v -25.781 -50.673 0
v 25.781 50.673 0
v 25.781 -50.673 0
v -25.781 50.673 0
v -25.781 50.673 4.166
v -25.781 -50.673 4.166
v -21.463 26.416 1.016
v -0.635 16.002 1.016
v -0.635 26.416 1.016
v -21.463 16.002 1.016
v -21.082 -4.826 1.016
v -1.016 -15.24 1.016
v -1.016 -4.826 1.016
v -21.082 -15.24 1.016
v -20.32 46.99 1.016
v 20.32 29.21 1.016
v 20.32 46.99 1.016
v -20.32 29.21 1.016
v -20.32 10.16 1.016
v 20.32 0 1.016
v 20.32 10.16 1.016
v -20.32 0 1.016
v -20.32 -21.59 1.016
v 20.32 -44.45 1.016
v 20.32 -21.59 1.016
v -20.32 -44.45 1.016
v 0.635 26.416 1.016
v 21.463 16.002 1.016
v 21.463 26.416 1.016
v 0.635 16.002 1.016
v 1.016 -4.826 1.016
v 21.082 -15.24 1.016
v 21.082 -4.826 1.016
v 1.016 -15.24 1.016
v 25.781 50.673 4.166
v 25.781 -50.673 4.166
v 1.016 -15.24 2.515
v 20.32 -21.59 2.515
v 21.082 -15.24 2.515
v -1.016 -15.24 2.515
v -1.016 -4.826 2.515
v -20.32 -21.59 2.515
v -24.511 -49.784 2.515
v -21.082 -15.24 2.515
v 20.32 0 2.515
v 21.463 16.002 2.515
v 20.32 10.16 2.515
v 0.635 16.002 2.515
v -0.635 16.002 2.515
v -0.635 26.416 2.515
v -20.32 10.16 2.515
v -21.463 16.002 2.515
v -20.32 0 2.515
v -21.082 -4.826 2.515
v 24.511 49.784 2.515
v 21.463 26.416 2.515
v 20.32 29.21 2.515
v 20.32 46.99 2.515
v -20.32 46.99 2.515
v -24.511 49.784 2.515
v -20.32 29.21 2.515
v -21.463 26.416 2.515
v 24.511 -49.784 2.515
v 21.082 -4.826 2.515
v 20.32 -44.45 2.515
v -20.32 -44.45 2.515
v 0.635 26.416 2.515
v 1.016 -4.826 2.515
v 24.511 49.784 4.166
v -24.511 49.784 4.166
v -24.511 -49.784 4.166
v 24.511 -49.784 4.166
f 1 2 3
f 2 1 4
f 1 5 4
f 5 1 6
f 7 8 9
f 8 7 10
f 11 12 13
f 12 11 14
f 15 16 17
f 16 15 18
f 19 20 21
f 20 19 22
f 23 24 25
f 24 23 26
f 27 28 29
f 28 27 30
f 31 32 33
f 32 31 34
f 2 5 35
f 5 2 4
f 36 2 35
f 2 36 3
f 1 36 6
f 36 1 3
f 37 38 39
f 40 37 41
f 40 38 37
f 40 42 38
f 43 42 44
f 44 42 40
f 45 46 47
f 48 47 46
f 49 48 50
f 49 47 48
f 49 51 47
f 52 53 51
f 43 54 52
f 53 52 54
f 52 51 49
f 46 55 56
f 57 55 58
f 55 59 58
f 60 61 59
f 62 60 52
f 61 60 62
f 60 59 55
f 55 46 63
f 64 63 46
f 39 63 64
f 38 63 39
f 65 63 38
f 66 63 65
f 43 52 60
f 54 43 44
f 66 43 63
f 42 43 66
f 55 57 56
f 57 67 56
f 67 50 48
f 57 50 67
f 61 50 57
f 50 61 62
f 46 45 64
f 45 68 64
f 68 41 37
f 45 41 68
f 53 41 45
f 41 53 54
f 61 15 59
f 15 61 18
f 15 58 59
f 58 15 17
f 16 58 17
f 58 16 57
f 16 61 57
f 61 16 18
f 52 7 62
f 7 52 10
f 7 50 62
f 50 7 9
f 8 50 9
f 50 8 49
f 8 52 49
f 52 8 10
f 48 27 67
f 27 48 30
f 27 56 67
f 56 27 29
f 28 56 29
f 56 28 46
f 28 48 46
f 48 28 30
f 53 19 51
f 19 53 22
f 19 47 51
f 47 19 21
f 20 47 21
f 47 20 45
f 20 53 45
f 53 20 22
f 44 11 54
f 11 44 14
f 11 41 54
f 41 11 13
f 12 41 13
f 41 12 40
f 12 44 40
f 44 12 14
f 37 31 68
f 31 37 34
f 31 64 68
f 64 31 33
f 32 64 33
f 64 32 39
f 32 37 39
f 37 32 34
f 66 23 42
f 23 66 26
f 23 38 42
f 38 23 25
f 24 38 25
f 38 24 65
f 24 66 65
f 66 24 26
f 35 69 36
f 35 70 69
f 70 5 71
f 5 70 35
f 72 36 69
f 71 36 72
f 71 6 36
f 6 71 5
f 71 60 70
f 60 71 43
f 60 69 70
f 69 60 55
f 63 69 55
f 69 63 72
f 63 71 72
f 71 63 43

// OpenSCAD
// file: components23.scad
module d23() 
{
translate([1469-1970/2,2480-3940/2,60])
circle(67/2, $fn=96);
translate([600-1970/2,2244-3940/2,60])
circle(67/2, $fn=96);
translate([1516-1970/2,250-3940/2,60])
circle(67/2, $fn=96);
translate([1553-1970/2,2362-3940/2,60])
circle(67/2, $fn=96);
translate([1012-1970/2,2126-3940/2,60])
circle(67/2, $fn=96);
translate([978-1970/2,673-3940/2,60])
circle(67/2, $fn=96);
}
// file: components22.scad
d22 = function(i) [896-1970/2,228-3940/2,1073-1970/2,559-3940/2][i];

module d22()
{
    hull()
    {
    translate([1073-1970/2,228-3940/2,60])
    square([63, 71], center=true);
    translate([1073-1970/2,559-3940/2,60])
    square([63, 71], center=true);
    translate([984-1970/2,559-3940/2,60])
    square([63, 71], center=true);
    translate([896-1970/2,559-3940/2,60])
    square([63, 71], center=true);
    translate([896-1970/2,228-3940/2,60])
    square([63, 71], center=true);
    }
}
// file: components21.scad
module d21()
{
translate([394-1970/2,469-3940/2,60])
square([79, 87], center=true);
}
// file: components20.scad
d20 = function() [[59, 87], [[344,319,443,319]]];

// module d20()
// {
// translate([344-1970/2,319-3940/2,60])
// square([59, 87], center=true);
// translate([443-1970/2,319-3940/2,60])
// square([59, 87], center=true);
// }
// file: components19.scad
d19 = function() [[71, 79], [[1657,2126,1769,2126], [790,2362,902,2362], [790,2126,902,2126],[790,2244,902,2244]]];

//module d19()
//{
//translate([1657-1970/2,2244-3940/2,60])
//square([71, 79], center=true);
//translate([1769-1970/2,2244-3940/2,60])
//square([71, 79], center=true);
//translate([1657-1970/2,2126-3940/2,60])
//square([71, 79], center=true);
//translate([1769-1970/2,2126-3940/2,60])
//square([71, 79], center=true);
//translate([790-1970/2,2362-3940/2,60])
//square([71, 79], center=true);
//translate([902-1970/2,2362-3940/2,60])
//square([71, 79], center=true);
//translate([790-1970/2,2126-3940/2,60])
//square([71, 79], center=true);
//translate([902-1970/2,2126-3940/2,60])
//square([71, 79], center=true);
//translate([790-1970/2,2244-3940/2,60])
//square([71, 79], center=true);
//translate([902-1970/2,2244-3940/2,60])
//square([71, 79], center=true);
//}
// file: components18.scad
d18 = function() [[79, 71], [[197,3363,197,3251],[394,771,394,883],[394,3363,394,3251],[591,3363,591,3251],[787,3363,787,3251],[984,3363,984,3251],[1181,3363,1181,3251],[1378,3363,1378,3251],[1575,3363,1575,3251],[1772,3363,1772,3251]]];


// module d18()
// {
// translate([197-1970/2,3363-3940/2,60])
// square([79, 71], center=true);
// translate([197-1970/2,3251-3940/2,60])
// square([79, 71], center=true);
// translate([394-1970/2,771-3940/2,60])
// square([79, 71], center=true);
// translate([394-1970/2,883-3940/2,60])
// square([79, 71], center=true);
// translate([394-1970/2,3363-3940/2,60])
// square([79, 71], center=true);
// translate([394-1970/2,3251-3940/2,60])
// square([79, 71], center=true);
// translate([591-1970/2,3363-3940/2,60])
// square([79, 71], center=true);
// translate([591-1970/2,3251-3940/2,60])
// square([79, 71], center=true);
// translate([787-1970/2,3363-3940/2,60])
// square([79, 71], center=true);
// translate([787-1970/2,3251-3940/2,60])
// square([79, 71], center=true);
// translate([984-1970/2,3363-3940/2,60])
// square([79, 71], center=true);
// translate([984-1970/2,3251-3940/2,60])
// square([79, 71], center=true);
// translate([1181-1970/2,3363-3940/2,60])
// square([79, 71], center=true);
// translate([1181-1970/2,3251-3940/2,60])
// square([79, 71], center=true);
// translate([1378-1970/2,3363-3940/2,60])
// square([79, 71], center=true);
// translate([1378-1970/2,3251-3940/2,60])
// square([79, 71], center=true);
// translate([1575-1970/2,3363-3940/2,60])
// square([79, 71], center=true);
// translate([1575-1970/2,3251-3940/2,60])
// square([79, 71], center=true);
// translate([1772-1970/2,3363-3940/2,60])
// square([79, 71], center=true);
// translate([1772-1970/2,3251-3940/2,60])
// square([79, 71], center=true);
// }
// file: components17.scad
d17 = function()
    [[67, 67], [[197,3612,197,3474], [394,3612,394,3474], [591,3612,591,3474], [787,3612,787,3474], [1181,3612,1181,3474], [1378,3612,1378,3474], [1575,3612,1575,3474], [1772,3612,1772,3474], [984,3612,984,3474]]];


// module d17()
// {
// translate([197-1970/2,3612-3940/2,60])
// square([67, 67], center=true);
// translate([197-1970/2,3474-3940/2,60])
// square([67, 67], center=true);
// translate([394-1970/2,3612-3940/2,60])
// square([67, 67], center=true);
// translate([394-1970/2,3474-3940/2,60])
// square([67, 67], center=true);
// translate([591-1970/2,3612-3940/2,60])
// square([67, 67], center=true);
// translate([591-1970/2,3474-3940/2,60])
// square([67, 67], center=true);
// translate([787-1970/2,3612-3940/2,60])
// square([67, 67], center=true);
// translate([787-1970/2,3474-3940/2,60])
// square([67, 67], center=true);
// translate([1181-1970/2,3612-3940/2,60])
// square([67, 67], center=true);
// translate([1181-1970/2,3474-3940/2,60])
// square([67, 67], center=true);
// translate([1378-1970/2,3612-3940/2,60])
// square([67, 67], center=true);
// translate([1378-1970/2,3474-3940/2,60])
// square([67, 67], center=true);
// translate([1575-1970/2,3612-3940/2,60])
// square([67, 67], center=true);
// translate([1575-1970/2,3474-3940/2,60])
// square([67, 67], center=true);
// translate([1772-1970/2,3612-3940/2,60])
// square([67, 67], center=true);
// translate([1772-1970/2,3474-3940/2,60])
// square([67, 67], center=true);
// translate([984-1970/2,3612-3940/2,60])
// square([67, 67], center=true);
// translate([984-1970/2,3474-3940/2,60])
// square([67, 67], center=true);
// }
// file: components16.scad
module d16()
{
translate([1715-1970/2,142-3940/2,60])
circle(68/2, $fn=96);
translate([1715-1970/2,82-3940/2,60])
circle(68/2, $fn=96);
translate([1815-1970/2,82-3940/2,60])
circle(68/2, $fn=96);
translate([1815-1970/2,142-3940/2,60])
circle(68/2, $fn=96);
}
// file: components15.scad
d15 = function() [[106, 126], [[1575,435, 1575,435]]];

// module d15()
// {
// translate([1575-1970/2,435-3940/2,60])
// square([106, 126], center=true);
// }
// file: components14.scad
d14 = function() [[39, 67], [[1634,325,1575,325]]];

// module d14()
// {
// translate([1634-1970/2,325-3940/2,60])
// square([39, 67], center=true);
// translate([1516-1970/2,325-3940/2,60])
// square([39, 67], center=true);
// translate([1575-1970/2,325-3940/2,60])
// square([39, 67], center=true);
// }
// file: components13.scad
ic1 = function(i) [201-1970/2,  2580-3940/2, 901-1970/2, 2632-3940/2][i];
ic2 = function(i) [1067-1970/2,2580-3940/2, 1767-1970/2,2632-3940/2][i];
ic3 = function(i) [1117-1970/2,1399-3940/2, 1717-1970/2,1751-3940/2][i];
ic4 = function(i) [251-1970/2,1399-3940/2,851-1970/2,1751-3940/2][i];


// module d13()
// {
// *color("red")
// {
// translate([201-1970/2,2580-3940/2,60])
// circle(60/2, $fn=96);
// translate([201-1970/2,2632-3940/2,60])
// circle(60/2, $fn=96);
// translate([301-1970/2,2632-3940/2,60])
// circle(60/2, $fn=96);
// translate([301-1970/2,2580-3940/2,60])
// circle(60/2, $fn=96);
// translate([801-1970/2,2580-3940/2,60])
// circle(60/2, $fn=96);
// translate([801-1970/2,2632-3940/2,60])
// circle(60/2, $fn=96);
// translate([901-1970/2,2632-3940/2,60])
// circle(60/2, $fn=96);
// translate([901-1970/2,2580-3940/2,60])
// circle(60/2, $fn=96);
// translate([401-1970/2,2580-3940/2,60])
// circle(60/2, $fn=96);
// translate([401-1970/2,2632-3940/2,60])
// circle(60/2, $fn=96);
// translate([501-1970/2,2632-3940/2,60])
// circle(60/2, $fn=96);
// translate([501-1970/2,2580-3940/2,60])
// circle(60/2, $fn=96);
// translate([701-1970/2,2580-3940/2,60])
// circle(60/2, $fn=96);
// translate([701-1970/2,2632-3940/2,60])
// circle(60/2, $fn=96);
// translate([601-1970/2,2632-3940/2,60])
// circle(60/2, $fn=96);
// translate([601-1970/2,2580-3940/2,60])
// circle(60/2, $fn=96);
// translate([901-1970/2,2880-3940/2,60])
// circle(60/2, $fn=96);
// translate([901-1970/2,2932-3940/2,60])
// circle(60/2, $fn=96);
// translate([801-1970/2,2932-3940/2,60])
// circle(60/2, $fn=96);
// translate([801-1970/2,2880-3940/2,60])
// circle(60/2, $fn=96);
// translate([701-1970/2,2880-3940/2,60])
// circle(60/2, $fn=96);
// translate([701-1970/2,2932-3940/2,60])
// circle(60/2, $fn=96);
// translate([601-1970/2,2932-3940/2,60])
// circle(60/2, $fn=96);
// translate([601-1970/2,2880-3940/2,60])
// circle(60/2, $fn=96);
// translate([501-1970/2,2880-3940/2,60])
// circle(60/2, $fn=96);
// translate([501-1970/2,2932-3940/2,60])
// circle(60/2, $fn=96);
// translate([401-1970/2,2932-3940/2,60])
// circle(60/2, $fn=96);
// translate([401-1970/2,2880-3940/2,60])
// circle(60/2, $fn=96);
// translate([301-1970/2,2880-3940/2,60])
// circle(60/2, $fn=96);
// translate([301-1970/2,2932-3940/2,60])
// circle(60/2, $fn=96);
// translate([201-1970/2,2932-3940/2,60])
// circle(60/2, $fn=96);
// translate([201-1970/2,2880-3940/2,60])
// circle(60/2, $fn=96);
// }
// *color("red")
// {
// translate([1067-1970/2,2632-3940/2,60])
// circle(60/2, $fn=96);
// translate([1067-1970/2,2580-3940/2,60])
// circle(60/2, $fn=96);
// translate([1167-1970/2,2580-3940/2,60])
// circle(60/2, $fn=96);
// translate([1167-1970/2,2632-3940/2,60])
// circle(60/2, $fn=96);
// translate([1667-1970/2,2632-3940/2,60])
// circle(60/2, $fn=96);
// translate([1667-1970/2,2580-3940/2,60])
// circle(60/2, $fn=96);
// translate([1767-1970/2,2580-3940/2,60])
// circle(60/2, $fn=96);
// translate([1767-1970/2,2632-3940/2,60])
// circle(60/2, $fn=96);
// translate([1267-1970/2,2632-3940/2,60])
// circle(60/2, $fn=96);
// translate([1267-1970/2,2580-3940/2,60])
// circle(60/2, $fn=96);
// translate([1367-1970/2,2580-3940/2,60])
// circle(60/2, $fn=96);
// translate([1367-1970/2,2632-3940/2,60])
// circle(60/2, $fn=96);
// translate([1567-1970/2,2632-3940/2,60])
// circle(60/2, $fn=96);
// translate([1567-1970/2,2580-3940/2,60])
// circle(60/2, $fn=96);
// translate([1467-1970/2,2580-3940/2,60])
// circle(60/2, $fn=96);
// translate([1467-1970/2,2632-3940/2,60])
// circle(60/2, $fn=96);
// translate([1767-1970/2,2880-3940/2,60])
// circle(60/2, $fn=96);
// translate([1767-1970/2,2932-3940/2,60])
// circle(60/2, $fn=96);
// translate([1667-1970/2,2932-3940/2,60])
// circle(60/2, $fn=96);
// translate([1667-1970/2,2880-3940/2,60])
// circle(60/2, $fn=96);
// translate([1567-1970/2,2880-3940/2,60])
// circle(60/2, $fn=96);
// translate([1567-1970/2,2932-3940/2,60])
// circle(60/2, $fn=96);
// translate([1467-1970/2,2932-3940/2,60])
// circle(60/2, $fn=96);
// translate([1467-1970/2,2880-3940/2,60])
// circle(60/2, $fn=96);
// translate([1367-1970/2,2880-3940/2,60])
// circle(60/2, $fn=96);
// translate([1367-1970/2,2932-3940/2,60])
// circle(60/2, $fn=96);
// translate([1267-1970/2,2932-3940/2,60])
// circle(60/2, $fn=96);
// translate([1267-1970/2,2880-3940/2,60])
// circle(60/2, $fn=96);
// translate([1167-1970/2,2880-3940/2,60])
// circle(60/2, $fn=96);
// translate([1167-1970/2,2932-3940/2,60])
// circle(60/2, $fn=96);
// translate([1067-1970/2,2932-3940/2,60])
// circle(60/2, $fn=96);
// translate([1067-1970/2,2880-3940/2,60])
// circle(60/2, $fn=96);
// }
// *color("red")
// {
// translate([1117-1970/2,1451-3940/2,60])
// circle(60/2, $fn=96);
// translate([1117-1970/2,1399-3940/2,60])
// circle(60/2, $fn=96);
// translate([1217-1970/2,1399-3940/2,60])
// circle(60/2, $fn=96);
// translate([1217-1970/2,1451-3940/2,60])
// circle(60/2, $fn=96);
// translate([1717-1970/2,1451-3940/2,60])
// circle(60/2, $fn=96);
// translate([1717-1970/2,1399-3940/2,60])
// circle(60/2, $fn=96);
// translate([1717-1970/2,1699-3940/2,60])
// circle(60/2, $fn=96);
// translate([1717-1970/2,1751-3940/2,60])
// circle(60/2, $fn=96);
// translate([1317-1970/2,1451-3940/2,60])
// circle(60/2, $fn=96);
// translate([1317-1970/2,1399-3940/2,60])
// circle(60/2, $fn=96);
// translate([1417-1970/2,1399-3940/2,60])
// circle(60/2, $fn=96);
// translate([1417-1970/2,1451-3940/2,60])
// circle(60/2, $fn=96);
// translate([1617-1970/2,1451-3940/2,60])
// circle(60/2, $fn=96);
// translate([1617-1970/2,1399-3940/2,60])
// circle(60/2, $fn=96);
// translate([1517-1970/2,1399-3940/2,60])
// circle(60/2, $fn=96);
// translate([1517-1970/2,1451-3940/2,60])
// circle(60/2, $fn=96);
// translate([1617-1970/2,1699-3940/2,60])
// circle(60/2, $fn=96);
// translate([1617-1970/2,1751-3940/2,60])
// circle(60/2, $fn=96);
// translate([1517-1970/2,1751-3940/2,60])
// circle(60/2, $fn=96);
// translate([1517-1970/2,1699-3940/2,60])
// circle(60/2, $fn=96);
// translate([1417-1970/2,1699-3940/2,60])
// circle(60/2, $fn=96);
// translate([1417-1970/2,1751-3940/2,60])
// circle(60/2, $fn=96);
// translate([1317-1970/2,1751-3940/2,60])
// circle(60/2, $fn=96);
// translate([1317-1970/2,1699-3940/2,60])
// circle(60/2, $fn=96);
// translate([1217-1970/2,1699-3940/2,60])
// circle(60/2, $fn=96);
// translate([1217-1970/2,1751-3940/2,60])
// circle(60/2, $fn=96);
// translate([1117-1970/2,1751-3940/2,60])
// circle(60/2, $fn=96);
// translate([1117-1970/2,1699-3940/2,60])
// circle(60/2, $fn=96);
// }
// color("red")
// {
// translate([251-1970/2,1451-3940/2,60])
// circle(60/2, $fn=96);
// translate([251-1970/2,1399-3940/2,60])
// circle(60/2, $fn=96);
// translate([351-1970/2,1399-3940/2,60])
// circle(60/2, $fn=96);
// translate([351-1970/2,1451-3940/2,60])
// circle(60/2, $fn=96);
// translate([851-1970/2,1451-3940/2,60])
// circle(60/2, $fn=96);
// translate([851-1970/2,1399-3940/2,60])
// circle(60/2, $fn=96);
// translate([851-1970/2,1699-3940/2,60])
// circle(60/2, $fn=96);
// translate([851-1970/2,1751-3940/2,60])
// circle(60/2, $fn=96);
// translate([451-1970/2,1451-3940/2,60])
// circle(60/2, $fn=96);
// translate([451-1970/2,1399-3940/2,60])
// circle(60/2, $fn=96);
// translate([551-1970/2,1399-3940/2,60])
// circle(60/2, $fn=96);
// translate([551-1970/2,1451-3940/2,60])
// circle(60/2, $fn=96);
// translate([751-1970/2,1451-3940/2,60])
// circle(60/2, $fn=96);
// translate([751-1970/2,1399-3940/2,60])
// circle(60/2, $fn=96);
// translate([651-1970/2,1399-3940/2,60])
// circle(60/2, $fn=96);
// translate([651-1970/2,1451-3940/2,60])
// circle(60/2, $fn=96);
// translate([751-1970/2,1699-3940/2,60])
// circle(60/2, $fn=96);
// translate([751-1970/2,1751-3940/2,60])
// circle(60/2, $fn=96);
// translate([651-1970/2,1751-3940/2,60])
// circle(60/2, $fn=96);
// translate([651-1970/2,1699-3940/2,60])
// circle(60/2, $fn=96);
// translate([551-1970/2,1699-3940/2,60])
// circle(60/2, $fn=96);
// translate([551-1970/2,1751-3940/2,60])
// circle(60/2, $fn=96);
// translate([451-1970/2,1751-3940/2,60])
// circle(60/2, $fn=96);
// translate([451-1970/2,1699-3940/2,60])
// circle(60/2, $fn=96);
// translate([351-1970/2,1699-3940/2,60])
// circle(60/2, $fn=96);
// translate([351-1970/2,1751-3940/2,60])
// circle(60/2, $fn=96);
// translate([251-1970/2,1751-3940/2,60])
// circle(60/2, $fn=96);
// translate([251-1970/2,1699-3940/2,60])
// circle(60/2, $fn=96);
// }
// }
// file: components12.scad
d12 = function()
[[102, 102], [[933,2008,760,2008],[1811,307,1811,480]]];

// module d12()
// {
// translate([933-1970/2,2008-3940/2,60])
// square([102, 102], center=true);
// translate([760-1970/2,2008-3940/2,60])
// square([102, 102], center=true);
// translate([1811-1970/2,307-3940/2,60])
// square([102, 102], center=true);
// translate([1811-1970/2,480-3940/2,60])
// square([102, 102], center=true);
// }
// file: components11.scad
d11 = function()
    [[71, 63], [[984,772,984,882],[128,1520,128,1630]]];
//translate([984,772])
//translate([984,882])
//translate([128,1520])
//translate([128,1630])

//module d11()
//{
//translate([984-1970/2,772-3940/2,60])
//square([71, 63], center=true);
//translate([984-1970/2,882-3940/2,60])
//square([71, 63], center=true);
//translate([128-1970/2,1520-3940/2,60])
//square([71, 63], center=true);
//translate([128-1970/2,1630-3940/2,60])
//square([71, 63], center=true);
//}
// file: components10.scad
d10 = function() 
    [[71, 79],[[791,2480,902,2480],[1657,2480,1768,2480],[1657,2362,1768,2362],[339,181,449,181],[1630,722,1630,624],[1520,722,1520,624]]];

//module d10()
//{
//    coords = [[791,2480,902,2480],[1657,2480,1768,2480],[1657,2362,1768,2362],[339,181,449,181],[1630,722,1630,624],[1520,722,1520,624]];
//
//    translate([0, 0, 60]) linear_extrude(100)
//    {
//        for (ii = coords)
//        {
//            hull() {
//                translate([ii[0]-1970/2,ii[1]-3940/2,0])
//                square([71, 79], center=true);
//                translate([ii[2]-1970/2,ii[3]-3940/2,0])
//                square([71, 79], center=true);
//            }
//        }
//    }
//}
// file: components_top.scad
include <components10.scad>
include <components11.scad>
include <components12.scad>
include <components13.scad>
include <components14.scad>
include <components15.scad>
include <components16.scad>
include <components17.scad>
include <components18.scad>
include <components19.scad>
include <components20.scad>
include <components21.scad>
include <components22.scad>
include <components23.scad>

module plot_components(size, coords)
{
    translate([0, 0, 0]) linear_extrude(100)
    {
        for (ii = coords)
        {
            hull() {
                translate([ii[0]-1970/2,ii[1]-3940/2,0])
                square(size, center=true);
                translate([ii[2]-1970/2,ii[3]-3940/2,0])
                square(size, center=true);
            }
        }
    }
}

module components_top()
{
    plot_components(d10()[0], d10()[1]);
    plot_components(d11()[0], d11()[1]);
    plot_components(d12()[0], d12()[1]);
//    d13(); // chips
    plot_components(d14()[0], d14()[1]);
    plot_components(d15()[0], d15()[1]);

    d16();
    plot_components(d17()[0], d17()[1]); // LEDs
    plot_components(d18()[0], d18()[1]); 
    plot_components(d19()[0], d19()[1]);
    //
    //plot_components(d20()[0], d20()[1]);
    *linear_extrude(100)
    d21();
    //
    //linear_extrude(100)
    //d22();
    d23();
}
// file: ../models/0805_resistor.scad
module model_0805_resistor()
{
    // End caps
    color("lightgray")
    {
        linear_extrude(20)
        {
            translate([40+21/2, 0, 0])
            square([21, 60], center=true);
            translate([-40-21/2, 0, 0])
            square([21, 60], center=true);
        }
    }
    // Body
    color("black")
    linear_extrude(20)
    square([80, 60], center=true);
}
// file: model_shoot.scad
include <../models/0805_resistor.scad>
//include <soldermask_top.scad>
include <components_top.scad>

model_shoot_chipSocket = function (pins) [400, pins * 100];
model_shoot_chipIC = function (pins) [240, 770];
model_shoot_pcb = function() [1970, 3940];
model_shoot_pcbX = function(x,xofs) -(model_shoot_pcb()[0]/2)+(x/2)+xofs;
model_shoot_pcbY = function(y,yofs) -(model_shoot_pcb()[1]/2)+(y/2)+yofs;
centerof = function(x0, x1) (x1 - x0)/2 + x0;


module model_shoot_ic(pins)
{
    // Socket
    color("darkslategray")
    linear_extrude(170)
    square(model_shoot_chipSocket(pins/2), center=true);

    // IC
    color("darkslategray")
    translate([0, 0, 169])
    linear_extrude(169)
    square(model_shoot_chipIC(pins/2), center=true);

    // Pins
    pinV = (pins/2 % 2) ? [-floor(pins/4)*100:100:floor(pins/4)*100] : [-floor(pins/4)*100+50:100:floor(pins/4)*100-50];
    for(ii = pinV)
    {
        for(jj = [-200+30+10, 200-30-10])
        {
            translate([jj, ii, 159])
            color("lightgrey")
            linear_extrude(20)
            circle(60/2, $fn=96);
        }
    }
}

module model_shoot_led()
{
    color("white")
    linear_extrude(10)
    square([130, 60], center=true);

    color("red")
    translate([0, 0, 9])
    linear_extrude(28)
    square([75, 60], center=true);
}


module model_shoot()
{
    translate([0, 0, 60])
    components_top();
    mspcbx = model_shoot_pcbX;
    mspcby = model_shoot_pcbY;
    mscs = model_shoot_chipSocket;

    pcbW = 3940;
    pcbH = 1970;
//    chipSocketW = 400;
    // PCB
    color("darkblue")
    linear_extrude(62)
    square(model_shoot_pcb(), center=true);

    // ICs
    translate([centerof(ic1(0), ic1(2)), centerof(ic1(1), ic1(3)) + 200, 61])
    rotate([0, 0, 90])
    model_shoot_ic(16);

    translate([centerof(ic2(0), ic2(2)), centerof(ic2(1), ic2(3)) + 200, 61])
    rotate([0, 0, 90])
    model_shoot_ic(16);

    translate([centerof(ic3(0), ic3(2)), centerof(ic3(1), ic3(3)), 61])
    rotate([0, 0, 90])
    model_shoot_ic(14);

    translate([centerof(ic4(0), ic4(2)), centerof(ic4(1), ic4(3)), 61])
    rotate([0, 0, 90])
    model_shoot_ic(14);



    *translate([mspcbx(mscs(7)[0], 1400), mspcby(mscs(7)[1], 193), 61])
    model_shoot_ic(14);

    *translate([mspcbx(mscs(8)[0], 2580), mspcby(mscs(8)[1], 990), 61])
    model_shoot_ic(16);
    *translate([mspcbx(mscs(8)[0], 2580), mspcby(mscs(8)[1], 147), 61])
    model_shoot_ic(16);


    // LEDs
    *for (ii = [-800:200:800])
    {
        translate([pcbW/2-130/2-394, ii+30, 62])
        model_shoot_led();
    }
    // Resistors
    *for (ii = [-800:200:800])
    {
        translate([pcbW/2-120/2-625, ii+30, 62])
        model_0805_resistor();
    }
    // Button body
    color("darkslategray")
    translate([centerof(d22(0), d22(2)), centerof(d22(1), d22(3)), 61])
    //translate([-pcbW/2+250/2+280, 0, 62])
    linear_extrude(166)
    square([250, 250], center=true);
    // Button actuator
    color("darkred")
    translate([centerof(d22(0), d22(2)), centerof(d22(1), d22(3)), 215])
    //translate([-pcbW/2+250/2+280, 0, 215])
    linear_extrude(50)
    circle(135/2, $fn=96);

    // speed pot
 //   *color("lightslategray")

//[344,319,
//443,319]]];
//[394,469

    color("lightslategray")
    translate([centerof(443, 344) - 1970/2, centerof(319, 394) - 3840/2, 61])
    //translate([-pcbW/2+200/2+320, pcbH/2-100-310, 62])
    linear_extrude(100)
    square([200, 200], center=true);
    translate([centerof(443, 344) - 1970/2, centerof(319, 394) - 3840/2, 150])
    //translate([-pcbW/2+200/2+320, pcbH/2-100-310, 150])
    color("lightgray")
    linear_extrude(20)
    circle(50, $fn=96);

}

//module forViewing()
//{
//    model_shoot();
//}
//
//
//scale(ViewScale)
//{
//    forViewing();
//}
// main file
ViewScale = [0.0254, 0.0254, 0.0254];
include <model_shoot.scad>

module chipsurround14_cutout()
{
    translate([-435, 0, 0])
    square([790, 410], center=true);
    translate([435, 0, 0])
    square([790, 410], center=true);
}

module chipsurround16_cutout()
{
    translate([-435, 0, 0])
    square([820, 410], center=true);
    translate([435, 0, 0])
    square([820, 410], center=true);
}


module surround()
{
//    color("black")

    linear_extrude(40)
    square([2030, 3990], center=true);
    translate([0, 0, 39])
    linear_extrude(60)
    difference()
    {
        square([2030, 3990], center=true);
        translate([0, 835, 0])
        chipsurround16_cutout();
        translate([0, -395, 0])
        chipsurround14_cutout();
        translate([0, -1300, 0])
        square([1600, 900], center = true);
        translate([0, 200, 0])
        square([1600, 400], center = true);

        translate([0, 1500, 0])
        square([1600, 700], center = true);
    }

    linear_extrude(63)
    difference()
    {
        square([2030, 3990], center=true);
        square([1980, 3950], center=true);
    }
    translate([0, 0, 99])
    linear_extrude(65)
    difference()
    {
        square([2030, 3990], center=true);
        square([1930, 3920], center=true);
    }
}

module forViewing()
{
    *translate([0, 0, 200])
    model_shoot();
    surround();
}


scale(ViewScale)
{
    forViewing();
}
